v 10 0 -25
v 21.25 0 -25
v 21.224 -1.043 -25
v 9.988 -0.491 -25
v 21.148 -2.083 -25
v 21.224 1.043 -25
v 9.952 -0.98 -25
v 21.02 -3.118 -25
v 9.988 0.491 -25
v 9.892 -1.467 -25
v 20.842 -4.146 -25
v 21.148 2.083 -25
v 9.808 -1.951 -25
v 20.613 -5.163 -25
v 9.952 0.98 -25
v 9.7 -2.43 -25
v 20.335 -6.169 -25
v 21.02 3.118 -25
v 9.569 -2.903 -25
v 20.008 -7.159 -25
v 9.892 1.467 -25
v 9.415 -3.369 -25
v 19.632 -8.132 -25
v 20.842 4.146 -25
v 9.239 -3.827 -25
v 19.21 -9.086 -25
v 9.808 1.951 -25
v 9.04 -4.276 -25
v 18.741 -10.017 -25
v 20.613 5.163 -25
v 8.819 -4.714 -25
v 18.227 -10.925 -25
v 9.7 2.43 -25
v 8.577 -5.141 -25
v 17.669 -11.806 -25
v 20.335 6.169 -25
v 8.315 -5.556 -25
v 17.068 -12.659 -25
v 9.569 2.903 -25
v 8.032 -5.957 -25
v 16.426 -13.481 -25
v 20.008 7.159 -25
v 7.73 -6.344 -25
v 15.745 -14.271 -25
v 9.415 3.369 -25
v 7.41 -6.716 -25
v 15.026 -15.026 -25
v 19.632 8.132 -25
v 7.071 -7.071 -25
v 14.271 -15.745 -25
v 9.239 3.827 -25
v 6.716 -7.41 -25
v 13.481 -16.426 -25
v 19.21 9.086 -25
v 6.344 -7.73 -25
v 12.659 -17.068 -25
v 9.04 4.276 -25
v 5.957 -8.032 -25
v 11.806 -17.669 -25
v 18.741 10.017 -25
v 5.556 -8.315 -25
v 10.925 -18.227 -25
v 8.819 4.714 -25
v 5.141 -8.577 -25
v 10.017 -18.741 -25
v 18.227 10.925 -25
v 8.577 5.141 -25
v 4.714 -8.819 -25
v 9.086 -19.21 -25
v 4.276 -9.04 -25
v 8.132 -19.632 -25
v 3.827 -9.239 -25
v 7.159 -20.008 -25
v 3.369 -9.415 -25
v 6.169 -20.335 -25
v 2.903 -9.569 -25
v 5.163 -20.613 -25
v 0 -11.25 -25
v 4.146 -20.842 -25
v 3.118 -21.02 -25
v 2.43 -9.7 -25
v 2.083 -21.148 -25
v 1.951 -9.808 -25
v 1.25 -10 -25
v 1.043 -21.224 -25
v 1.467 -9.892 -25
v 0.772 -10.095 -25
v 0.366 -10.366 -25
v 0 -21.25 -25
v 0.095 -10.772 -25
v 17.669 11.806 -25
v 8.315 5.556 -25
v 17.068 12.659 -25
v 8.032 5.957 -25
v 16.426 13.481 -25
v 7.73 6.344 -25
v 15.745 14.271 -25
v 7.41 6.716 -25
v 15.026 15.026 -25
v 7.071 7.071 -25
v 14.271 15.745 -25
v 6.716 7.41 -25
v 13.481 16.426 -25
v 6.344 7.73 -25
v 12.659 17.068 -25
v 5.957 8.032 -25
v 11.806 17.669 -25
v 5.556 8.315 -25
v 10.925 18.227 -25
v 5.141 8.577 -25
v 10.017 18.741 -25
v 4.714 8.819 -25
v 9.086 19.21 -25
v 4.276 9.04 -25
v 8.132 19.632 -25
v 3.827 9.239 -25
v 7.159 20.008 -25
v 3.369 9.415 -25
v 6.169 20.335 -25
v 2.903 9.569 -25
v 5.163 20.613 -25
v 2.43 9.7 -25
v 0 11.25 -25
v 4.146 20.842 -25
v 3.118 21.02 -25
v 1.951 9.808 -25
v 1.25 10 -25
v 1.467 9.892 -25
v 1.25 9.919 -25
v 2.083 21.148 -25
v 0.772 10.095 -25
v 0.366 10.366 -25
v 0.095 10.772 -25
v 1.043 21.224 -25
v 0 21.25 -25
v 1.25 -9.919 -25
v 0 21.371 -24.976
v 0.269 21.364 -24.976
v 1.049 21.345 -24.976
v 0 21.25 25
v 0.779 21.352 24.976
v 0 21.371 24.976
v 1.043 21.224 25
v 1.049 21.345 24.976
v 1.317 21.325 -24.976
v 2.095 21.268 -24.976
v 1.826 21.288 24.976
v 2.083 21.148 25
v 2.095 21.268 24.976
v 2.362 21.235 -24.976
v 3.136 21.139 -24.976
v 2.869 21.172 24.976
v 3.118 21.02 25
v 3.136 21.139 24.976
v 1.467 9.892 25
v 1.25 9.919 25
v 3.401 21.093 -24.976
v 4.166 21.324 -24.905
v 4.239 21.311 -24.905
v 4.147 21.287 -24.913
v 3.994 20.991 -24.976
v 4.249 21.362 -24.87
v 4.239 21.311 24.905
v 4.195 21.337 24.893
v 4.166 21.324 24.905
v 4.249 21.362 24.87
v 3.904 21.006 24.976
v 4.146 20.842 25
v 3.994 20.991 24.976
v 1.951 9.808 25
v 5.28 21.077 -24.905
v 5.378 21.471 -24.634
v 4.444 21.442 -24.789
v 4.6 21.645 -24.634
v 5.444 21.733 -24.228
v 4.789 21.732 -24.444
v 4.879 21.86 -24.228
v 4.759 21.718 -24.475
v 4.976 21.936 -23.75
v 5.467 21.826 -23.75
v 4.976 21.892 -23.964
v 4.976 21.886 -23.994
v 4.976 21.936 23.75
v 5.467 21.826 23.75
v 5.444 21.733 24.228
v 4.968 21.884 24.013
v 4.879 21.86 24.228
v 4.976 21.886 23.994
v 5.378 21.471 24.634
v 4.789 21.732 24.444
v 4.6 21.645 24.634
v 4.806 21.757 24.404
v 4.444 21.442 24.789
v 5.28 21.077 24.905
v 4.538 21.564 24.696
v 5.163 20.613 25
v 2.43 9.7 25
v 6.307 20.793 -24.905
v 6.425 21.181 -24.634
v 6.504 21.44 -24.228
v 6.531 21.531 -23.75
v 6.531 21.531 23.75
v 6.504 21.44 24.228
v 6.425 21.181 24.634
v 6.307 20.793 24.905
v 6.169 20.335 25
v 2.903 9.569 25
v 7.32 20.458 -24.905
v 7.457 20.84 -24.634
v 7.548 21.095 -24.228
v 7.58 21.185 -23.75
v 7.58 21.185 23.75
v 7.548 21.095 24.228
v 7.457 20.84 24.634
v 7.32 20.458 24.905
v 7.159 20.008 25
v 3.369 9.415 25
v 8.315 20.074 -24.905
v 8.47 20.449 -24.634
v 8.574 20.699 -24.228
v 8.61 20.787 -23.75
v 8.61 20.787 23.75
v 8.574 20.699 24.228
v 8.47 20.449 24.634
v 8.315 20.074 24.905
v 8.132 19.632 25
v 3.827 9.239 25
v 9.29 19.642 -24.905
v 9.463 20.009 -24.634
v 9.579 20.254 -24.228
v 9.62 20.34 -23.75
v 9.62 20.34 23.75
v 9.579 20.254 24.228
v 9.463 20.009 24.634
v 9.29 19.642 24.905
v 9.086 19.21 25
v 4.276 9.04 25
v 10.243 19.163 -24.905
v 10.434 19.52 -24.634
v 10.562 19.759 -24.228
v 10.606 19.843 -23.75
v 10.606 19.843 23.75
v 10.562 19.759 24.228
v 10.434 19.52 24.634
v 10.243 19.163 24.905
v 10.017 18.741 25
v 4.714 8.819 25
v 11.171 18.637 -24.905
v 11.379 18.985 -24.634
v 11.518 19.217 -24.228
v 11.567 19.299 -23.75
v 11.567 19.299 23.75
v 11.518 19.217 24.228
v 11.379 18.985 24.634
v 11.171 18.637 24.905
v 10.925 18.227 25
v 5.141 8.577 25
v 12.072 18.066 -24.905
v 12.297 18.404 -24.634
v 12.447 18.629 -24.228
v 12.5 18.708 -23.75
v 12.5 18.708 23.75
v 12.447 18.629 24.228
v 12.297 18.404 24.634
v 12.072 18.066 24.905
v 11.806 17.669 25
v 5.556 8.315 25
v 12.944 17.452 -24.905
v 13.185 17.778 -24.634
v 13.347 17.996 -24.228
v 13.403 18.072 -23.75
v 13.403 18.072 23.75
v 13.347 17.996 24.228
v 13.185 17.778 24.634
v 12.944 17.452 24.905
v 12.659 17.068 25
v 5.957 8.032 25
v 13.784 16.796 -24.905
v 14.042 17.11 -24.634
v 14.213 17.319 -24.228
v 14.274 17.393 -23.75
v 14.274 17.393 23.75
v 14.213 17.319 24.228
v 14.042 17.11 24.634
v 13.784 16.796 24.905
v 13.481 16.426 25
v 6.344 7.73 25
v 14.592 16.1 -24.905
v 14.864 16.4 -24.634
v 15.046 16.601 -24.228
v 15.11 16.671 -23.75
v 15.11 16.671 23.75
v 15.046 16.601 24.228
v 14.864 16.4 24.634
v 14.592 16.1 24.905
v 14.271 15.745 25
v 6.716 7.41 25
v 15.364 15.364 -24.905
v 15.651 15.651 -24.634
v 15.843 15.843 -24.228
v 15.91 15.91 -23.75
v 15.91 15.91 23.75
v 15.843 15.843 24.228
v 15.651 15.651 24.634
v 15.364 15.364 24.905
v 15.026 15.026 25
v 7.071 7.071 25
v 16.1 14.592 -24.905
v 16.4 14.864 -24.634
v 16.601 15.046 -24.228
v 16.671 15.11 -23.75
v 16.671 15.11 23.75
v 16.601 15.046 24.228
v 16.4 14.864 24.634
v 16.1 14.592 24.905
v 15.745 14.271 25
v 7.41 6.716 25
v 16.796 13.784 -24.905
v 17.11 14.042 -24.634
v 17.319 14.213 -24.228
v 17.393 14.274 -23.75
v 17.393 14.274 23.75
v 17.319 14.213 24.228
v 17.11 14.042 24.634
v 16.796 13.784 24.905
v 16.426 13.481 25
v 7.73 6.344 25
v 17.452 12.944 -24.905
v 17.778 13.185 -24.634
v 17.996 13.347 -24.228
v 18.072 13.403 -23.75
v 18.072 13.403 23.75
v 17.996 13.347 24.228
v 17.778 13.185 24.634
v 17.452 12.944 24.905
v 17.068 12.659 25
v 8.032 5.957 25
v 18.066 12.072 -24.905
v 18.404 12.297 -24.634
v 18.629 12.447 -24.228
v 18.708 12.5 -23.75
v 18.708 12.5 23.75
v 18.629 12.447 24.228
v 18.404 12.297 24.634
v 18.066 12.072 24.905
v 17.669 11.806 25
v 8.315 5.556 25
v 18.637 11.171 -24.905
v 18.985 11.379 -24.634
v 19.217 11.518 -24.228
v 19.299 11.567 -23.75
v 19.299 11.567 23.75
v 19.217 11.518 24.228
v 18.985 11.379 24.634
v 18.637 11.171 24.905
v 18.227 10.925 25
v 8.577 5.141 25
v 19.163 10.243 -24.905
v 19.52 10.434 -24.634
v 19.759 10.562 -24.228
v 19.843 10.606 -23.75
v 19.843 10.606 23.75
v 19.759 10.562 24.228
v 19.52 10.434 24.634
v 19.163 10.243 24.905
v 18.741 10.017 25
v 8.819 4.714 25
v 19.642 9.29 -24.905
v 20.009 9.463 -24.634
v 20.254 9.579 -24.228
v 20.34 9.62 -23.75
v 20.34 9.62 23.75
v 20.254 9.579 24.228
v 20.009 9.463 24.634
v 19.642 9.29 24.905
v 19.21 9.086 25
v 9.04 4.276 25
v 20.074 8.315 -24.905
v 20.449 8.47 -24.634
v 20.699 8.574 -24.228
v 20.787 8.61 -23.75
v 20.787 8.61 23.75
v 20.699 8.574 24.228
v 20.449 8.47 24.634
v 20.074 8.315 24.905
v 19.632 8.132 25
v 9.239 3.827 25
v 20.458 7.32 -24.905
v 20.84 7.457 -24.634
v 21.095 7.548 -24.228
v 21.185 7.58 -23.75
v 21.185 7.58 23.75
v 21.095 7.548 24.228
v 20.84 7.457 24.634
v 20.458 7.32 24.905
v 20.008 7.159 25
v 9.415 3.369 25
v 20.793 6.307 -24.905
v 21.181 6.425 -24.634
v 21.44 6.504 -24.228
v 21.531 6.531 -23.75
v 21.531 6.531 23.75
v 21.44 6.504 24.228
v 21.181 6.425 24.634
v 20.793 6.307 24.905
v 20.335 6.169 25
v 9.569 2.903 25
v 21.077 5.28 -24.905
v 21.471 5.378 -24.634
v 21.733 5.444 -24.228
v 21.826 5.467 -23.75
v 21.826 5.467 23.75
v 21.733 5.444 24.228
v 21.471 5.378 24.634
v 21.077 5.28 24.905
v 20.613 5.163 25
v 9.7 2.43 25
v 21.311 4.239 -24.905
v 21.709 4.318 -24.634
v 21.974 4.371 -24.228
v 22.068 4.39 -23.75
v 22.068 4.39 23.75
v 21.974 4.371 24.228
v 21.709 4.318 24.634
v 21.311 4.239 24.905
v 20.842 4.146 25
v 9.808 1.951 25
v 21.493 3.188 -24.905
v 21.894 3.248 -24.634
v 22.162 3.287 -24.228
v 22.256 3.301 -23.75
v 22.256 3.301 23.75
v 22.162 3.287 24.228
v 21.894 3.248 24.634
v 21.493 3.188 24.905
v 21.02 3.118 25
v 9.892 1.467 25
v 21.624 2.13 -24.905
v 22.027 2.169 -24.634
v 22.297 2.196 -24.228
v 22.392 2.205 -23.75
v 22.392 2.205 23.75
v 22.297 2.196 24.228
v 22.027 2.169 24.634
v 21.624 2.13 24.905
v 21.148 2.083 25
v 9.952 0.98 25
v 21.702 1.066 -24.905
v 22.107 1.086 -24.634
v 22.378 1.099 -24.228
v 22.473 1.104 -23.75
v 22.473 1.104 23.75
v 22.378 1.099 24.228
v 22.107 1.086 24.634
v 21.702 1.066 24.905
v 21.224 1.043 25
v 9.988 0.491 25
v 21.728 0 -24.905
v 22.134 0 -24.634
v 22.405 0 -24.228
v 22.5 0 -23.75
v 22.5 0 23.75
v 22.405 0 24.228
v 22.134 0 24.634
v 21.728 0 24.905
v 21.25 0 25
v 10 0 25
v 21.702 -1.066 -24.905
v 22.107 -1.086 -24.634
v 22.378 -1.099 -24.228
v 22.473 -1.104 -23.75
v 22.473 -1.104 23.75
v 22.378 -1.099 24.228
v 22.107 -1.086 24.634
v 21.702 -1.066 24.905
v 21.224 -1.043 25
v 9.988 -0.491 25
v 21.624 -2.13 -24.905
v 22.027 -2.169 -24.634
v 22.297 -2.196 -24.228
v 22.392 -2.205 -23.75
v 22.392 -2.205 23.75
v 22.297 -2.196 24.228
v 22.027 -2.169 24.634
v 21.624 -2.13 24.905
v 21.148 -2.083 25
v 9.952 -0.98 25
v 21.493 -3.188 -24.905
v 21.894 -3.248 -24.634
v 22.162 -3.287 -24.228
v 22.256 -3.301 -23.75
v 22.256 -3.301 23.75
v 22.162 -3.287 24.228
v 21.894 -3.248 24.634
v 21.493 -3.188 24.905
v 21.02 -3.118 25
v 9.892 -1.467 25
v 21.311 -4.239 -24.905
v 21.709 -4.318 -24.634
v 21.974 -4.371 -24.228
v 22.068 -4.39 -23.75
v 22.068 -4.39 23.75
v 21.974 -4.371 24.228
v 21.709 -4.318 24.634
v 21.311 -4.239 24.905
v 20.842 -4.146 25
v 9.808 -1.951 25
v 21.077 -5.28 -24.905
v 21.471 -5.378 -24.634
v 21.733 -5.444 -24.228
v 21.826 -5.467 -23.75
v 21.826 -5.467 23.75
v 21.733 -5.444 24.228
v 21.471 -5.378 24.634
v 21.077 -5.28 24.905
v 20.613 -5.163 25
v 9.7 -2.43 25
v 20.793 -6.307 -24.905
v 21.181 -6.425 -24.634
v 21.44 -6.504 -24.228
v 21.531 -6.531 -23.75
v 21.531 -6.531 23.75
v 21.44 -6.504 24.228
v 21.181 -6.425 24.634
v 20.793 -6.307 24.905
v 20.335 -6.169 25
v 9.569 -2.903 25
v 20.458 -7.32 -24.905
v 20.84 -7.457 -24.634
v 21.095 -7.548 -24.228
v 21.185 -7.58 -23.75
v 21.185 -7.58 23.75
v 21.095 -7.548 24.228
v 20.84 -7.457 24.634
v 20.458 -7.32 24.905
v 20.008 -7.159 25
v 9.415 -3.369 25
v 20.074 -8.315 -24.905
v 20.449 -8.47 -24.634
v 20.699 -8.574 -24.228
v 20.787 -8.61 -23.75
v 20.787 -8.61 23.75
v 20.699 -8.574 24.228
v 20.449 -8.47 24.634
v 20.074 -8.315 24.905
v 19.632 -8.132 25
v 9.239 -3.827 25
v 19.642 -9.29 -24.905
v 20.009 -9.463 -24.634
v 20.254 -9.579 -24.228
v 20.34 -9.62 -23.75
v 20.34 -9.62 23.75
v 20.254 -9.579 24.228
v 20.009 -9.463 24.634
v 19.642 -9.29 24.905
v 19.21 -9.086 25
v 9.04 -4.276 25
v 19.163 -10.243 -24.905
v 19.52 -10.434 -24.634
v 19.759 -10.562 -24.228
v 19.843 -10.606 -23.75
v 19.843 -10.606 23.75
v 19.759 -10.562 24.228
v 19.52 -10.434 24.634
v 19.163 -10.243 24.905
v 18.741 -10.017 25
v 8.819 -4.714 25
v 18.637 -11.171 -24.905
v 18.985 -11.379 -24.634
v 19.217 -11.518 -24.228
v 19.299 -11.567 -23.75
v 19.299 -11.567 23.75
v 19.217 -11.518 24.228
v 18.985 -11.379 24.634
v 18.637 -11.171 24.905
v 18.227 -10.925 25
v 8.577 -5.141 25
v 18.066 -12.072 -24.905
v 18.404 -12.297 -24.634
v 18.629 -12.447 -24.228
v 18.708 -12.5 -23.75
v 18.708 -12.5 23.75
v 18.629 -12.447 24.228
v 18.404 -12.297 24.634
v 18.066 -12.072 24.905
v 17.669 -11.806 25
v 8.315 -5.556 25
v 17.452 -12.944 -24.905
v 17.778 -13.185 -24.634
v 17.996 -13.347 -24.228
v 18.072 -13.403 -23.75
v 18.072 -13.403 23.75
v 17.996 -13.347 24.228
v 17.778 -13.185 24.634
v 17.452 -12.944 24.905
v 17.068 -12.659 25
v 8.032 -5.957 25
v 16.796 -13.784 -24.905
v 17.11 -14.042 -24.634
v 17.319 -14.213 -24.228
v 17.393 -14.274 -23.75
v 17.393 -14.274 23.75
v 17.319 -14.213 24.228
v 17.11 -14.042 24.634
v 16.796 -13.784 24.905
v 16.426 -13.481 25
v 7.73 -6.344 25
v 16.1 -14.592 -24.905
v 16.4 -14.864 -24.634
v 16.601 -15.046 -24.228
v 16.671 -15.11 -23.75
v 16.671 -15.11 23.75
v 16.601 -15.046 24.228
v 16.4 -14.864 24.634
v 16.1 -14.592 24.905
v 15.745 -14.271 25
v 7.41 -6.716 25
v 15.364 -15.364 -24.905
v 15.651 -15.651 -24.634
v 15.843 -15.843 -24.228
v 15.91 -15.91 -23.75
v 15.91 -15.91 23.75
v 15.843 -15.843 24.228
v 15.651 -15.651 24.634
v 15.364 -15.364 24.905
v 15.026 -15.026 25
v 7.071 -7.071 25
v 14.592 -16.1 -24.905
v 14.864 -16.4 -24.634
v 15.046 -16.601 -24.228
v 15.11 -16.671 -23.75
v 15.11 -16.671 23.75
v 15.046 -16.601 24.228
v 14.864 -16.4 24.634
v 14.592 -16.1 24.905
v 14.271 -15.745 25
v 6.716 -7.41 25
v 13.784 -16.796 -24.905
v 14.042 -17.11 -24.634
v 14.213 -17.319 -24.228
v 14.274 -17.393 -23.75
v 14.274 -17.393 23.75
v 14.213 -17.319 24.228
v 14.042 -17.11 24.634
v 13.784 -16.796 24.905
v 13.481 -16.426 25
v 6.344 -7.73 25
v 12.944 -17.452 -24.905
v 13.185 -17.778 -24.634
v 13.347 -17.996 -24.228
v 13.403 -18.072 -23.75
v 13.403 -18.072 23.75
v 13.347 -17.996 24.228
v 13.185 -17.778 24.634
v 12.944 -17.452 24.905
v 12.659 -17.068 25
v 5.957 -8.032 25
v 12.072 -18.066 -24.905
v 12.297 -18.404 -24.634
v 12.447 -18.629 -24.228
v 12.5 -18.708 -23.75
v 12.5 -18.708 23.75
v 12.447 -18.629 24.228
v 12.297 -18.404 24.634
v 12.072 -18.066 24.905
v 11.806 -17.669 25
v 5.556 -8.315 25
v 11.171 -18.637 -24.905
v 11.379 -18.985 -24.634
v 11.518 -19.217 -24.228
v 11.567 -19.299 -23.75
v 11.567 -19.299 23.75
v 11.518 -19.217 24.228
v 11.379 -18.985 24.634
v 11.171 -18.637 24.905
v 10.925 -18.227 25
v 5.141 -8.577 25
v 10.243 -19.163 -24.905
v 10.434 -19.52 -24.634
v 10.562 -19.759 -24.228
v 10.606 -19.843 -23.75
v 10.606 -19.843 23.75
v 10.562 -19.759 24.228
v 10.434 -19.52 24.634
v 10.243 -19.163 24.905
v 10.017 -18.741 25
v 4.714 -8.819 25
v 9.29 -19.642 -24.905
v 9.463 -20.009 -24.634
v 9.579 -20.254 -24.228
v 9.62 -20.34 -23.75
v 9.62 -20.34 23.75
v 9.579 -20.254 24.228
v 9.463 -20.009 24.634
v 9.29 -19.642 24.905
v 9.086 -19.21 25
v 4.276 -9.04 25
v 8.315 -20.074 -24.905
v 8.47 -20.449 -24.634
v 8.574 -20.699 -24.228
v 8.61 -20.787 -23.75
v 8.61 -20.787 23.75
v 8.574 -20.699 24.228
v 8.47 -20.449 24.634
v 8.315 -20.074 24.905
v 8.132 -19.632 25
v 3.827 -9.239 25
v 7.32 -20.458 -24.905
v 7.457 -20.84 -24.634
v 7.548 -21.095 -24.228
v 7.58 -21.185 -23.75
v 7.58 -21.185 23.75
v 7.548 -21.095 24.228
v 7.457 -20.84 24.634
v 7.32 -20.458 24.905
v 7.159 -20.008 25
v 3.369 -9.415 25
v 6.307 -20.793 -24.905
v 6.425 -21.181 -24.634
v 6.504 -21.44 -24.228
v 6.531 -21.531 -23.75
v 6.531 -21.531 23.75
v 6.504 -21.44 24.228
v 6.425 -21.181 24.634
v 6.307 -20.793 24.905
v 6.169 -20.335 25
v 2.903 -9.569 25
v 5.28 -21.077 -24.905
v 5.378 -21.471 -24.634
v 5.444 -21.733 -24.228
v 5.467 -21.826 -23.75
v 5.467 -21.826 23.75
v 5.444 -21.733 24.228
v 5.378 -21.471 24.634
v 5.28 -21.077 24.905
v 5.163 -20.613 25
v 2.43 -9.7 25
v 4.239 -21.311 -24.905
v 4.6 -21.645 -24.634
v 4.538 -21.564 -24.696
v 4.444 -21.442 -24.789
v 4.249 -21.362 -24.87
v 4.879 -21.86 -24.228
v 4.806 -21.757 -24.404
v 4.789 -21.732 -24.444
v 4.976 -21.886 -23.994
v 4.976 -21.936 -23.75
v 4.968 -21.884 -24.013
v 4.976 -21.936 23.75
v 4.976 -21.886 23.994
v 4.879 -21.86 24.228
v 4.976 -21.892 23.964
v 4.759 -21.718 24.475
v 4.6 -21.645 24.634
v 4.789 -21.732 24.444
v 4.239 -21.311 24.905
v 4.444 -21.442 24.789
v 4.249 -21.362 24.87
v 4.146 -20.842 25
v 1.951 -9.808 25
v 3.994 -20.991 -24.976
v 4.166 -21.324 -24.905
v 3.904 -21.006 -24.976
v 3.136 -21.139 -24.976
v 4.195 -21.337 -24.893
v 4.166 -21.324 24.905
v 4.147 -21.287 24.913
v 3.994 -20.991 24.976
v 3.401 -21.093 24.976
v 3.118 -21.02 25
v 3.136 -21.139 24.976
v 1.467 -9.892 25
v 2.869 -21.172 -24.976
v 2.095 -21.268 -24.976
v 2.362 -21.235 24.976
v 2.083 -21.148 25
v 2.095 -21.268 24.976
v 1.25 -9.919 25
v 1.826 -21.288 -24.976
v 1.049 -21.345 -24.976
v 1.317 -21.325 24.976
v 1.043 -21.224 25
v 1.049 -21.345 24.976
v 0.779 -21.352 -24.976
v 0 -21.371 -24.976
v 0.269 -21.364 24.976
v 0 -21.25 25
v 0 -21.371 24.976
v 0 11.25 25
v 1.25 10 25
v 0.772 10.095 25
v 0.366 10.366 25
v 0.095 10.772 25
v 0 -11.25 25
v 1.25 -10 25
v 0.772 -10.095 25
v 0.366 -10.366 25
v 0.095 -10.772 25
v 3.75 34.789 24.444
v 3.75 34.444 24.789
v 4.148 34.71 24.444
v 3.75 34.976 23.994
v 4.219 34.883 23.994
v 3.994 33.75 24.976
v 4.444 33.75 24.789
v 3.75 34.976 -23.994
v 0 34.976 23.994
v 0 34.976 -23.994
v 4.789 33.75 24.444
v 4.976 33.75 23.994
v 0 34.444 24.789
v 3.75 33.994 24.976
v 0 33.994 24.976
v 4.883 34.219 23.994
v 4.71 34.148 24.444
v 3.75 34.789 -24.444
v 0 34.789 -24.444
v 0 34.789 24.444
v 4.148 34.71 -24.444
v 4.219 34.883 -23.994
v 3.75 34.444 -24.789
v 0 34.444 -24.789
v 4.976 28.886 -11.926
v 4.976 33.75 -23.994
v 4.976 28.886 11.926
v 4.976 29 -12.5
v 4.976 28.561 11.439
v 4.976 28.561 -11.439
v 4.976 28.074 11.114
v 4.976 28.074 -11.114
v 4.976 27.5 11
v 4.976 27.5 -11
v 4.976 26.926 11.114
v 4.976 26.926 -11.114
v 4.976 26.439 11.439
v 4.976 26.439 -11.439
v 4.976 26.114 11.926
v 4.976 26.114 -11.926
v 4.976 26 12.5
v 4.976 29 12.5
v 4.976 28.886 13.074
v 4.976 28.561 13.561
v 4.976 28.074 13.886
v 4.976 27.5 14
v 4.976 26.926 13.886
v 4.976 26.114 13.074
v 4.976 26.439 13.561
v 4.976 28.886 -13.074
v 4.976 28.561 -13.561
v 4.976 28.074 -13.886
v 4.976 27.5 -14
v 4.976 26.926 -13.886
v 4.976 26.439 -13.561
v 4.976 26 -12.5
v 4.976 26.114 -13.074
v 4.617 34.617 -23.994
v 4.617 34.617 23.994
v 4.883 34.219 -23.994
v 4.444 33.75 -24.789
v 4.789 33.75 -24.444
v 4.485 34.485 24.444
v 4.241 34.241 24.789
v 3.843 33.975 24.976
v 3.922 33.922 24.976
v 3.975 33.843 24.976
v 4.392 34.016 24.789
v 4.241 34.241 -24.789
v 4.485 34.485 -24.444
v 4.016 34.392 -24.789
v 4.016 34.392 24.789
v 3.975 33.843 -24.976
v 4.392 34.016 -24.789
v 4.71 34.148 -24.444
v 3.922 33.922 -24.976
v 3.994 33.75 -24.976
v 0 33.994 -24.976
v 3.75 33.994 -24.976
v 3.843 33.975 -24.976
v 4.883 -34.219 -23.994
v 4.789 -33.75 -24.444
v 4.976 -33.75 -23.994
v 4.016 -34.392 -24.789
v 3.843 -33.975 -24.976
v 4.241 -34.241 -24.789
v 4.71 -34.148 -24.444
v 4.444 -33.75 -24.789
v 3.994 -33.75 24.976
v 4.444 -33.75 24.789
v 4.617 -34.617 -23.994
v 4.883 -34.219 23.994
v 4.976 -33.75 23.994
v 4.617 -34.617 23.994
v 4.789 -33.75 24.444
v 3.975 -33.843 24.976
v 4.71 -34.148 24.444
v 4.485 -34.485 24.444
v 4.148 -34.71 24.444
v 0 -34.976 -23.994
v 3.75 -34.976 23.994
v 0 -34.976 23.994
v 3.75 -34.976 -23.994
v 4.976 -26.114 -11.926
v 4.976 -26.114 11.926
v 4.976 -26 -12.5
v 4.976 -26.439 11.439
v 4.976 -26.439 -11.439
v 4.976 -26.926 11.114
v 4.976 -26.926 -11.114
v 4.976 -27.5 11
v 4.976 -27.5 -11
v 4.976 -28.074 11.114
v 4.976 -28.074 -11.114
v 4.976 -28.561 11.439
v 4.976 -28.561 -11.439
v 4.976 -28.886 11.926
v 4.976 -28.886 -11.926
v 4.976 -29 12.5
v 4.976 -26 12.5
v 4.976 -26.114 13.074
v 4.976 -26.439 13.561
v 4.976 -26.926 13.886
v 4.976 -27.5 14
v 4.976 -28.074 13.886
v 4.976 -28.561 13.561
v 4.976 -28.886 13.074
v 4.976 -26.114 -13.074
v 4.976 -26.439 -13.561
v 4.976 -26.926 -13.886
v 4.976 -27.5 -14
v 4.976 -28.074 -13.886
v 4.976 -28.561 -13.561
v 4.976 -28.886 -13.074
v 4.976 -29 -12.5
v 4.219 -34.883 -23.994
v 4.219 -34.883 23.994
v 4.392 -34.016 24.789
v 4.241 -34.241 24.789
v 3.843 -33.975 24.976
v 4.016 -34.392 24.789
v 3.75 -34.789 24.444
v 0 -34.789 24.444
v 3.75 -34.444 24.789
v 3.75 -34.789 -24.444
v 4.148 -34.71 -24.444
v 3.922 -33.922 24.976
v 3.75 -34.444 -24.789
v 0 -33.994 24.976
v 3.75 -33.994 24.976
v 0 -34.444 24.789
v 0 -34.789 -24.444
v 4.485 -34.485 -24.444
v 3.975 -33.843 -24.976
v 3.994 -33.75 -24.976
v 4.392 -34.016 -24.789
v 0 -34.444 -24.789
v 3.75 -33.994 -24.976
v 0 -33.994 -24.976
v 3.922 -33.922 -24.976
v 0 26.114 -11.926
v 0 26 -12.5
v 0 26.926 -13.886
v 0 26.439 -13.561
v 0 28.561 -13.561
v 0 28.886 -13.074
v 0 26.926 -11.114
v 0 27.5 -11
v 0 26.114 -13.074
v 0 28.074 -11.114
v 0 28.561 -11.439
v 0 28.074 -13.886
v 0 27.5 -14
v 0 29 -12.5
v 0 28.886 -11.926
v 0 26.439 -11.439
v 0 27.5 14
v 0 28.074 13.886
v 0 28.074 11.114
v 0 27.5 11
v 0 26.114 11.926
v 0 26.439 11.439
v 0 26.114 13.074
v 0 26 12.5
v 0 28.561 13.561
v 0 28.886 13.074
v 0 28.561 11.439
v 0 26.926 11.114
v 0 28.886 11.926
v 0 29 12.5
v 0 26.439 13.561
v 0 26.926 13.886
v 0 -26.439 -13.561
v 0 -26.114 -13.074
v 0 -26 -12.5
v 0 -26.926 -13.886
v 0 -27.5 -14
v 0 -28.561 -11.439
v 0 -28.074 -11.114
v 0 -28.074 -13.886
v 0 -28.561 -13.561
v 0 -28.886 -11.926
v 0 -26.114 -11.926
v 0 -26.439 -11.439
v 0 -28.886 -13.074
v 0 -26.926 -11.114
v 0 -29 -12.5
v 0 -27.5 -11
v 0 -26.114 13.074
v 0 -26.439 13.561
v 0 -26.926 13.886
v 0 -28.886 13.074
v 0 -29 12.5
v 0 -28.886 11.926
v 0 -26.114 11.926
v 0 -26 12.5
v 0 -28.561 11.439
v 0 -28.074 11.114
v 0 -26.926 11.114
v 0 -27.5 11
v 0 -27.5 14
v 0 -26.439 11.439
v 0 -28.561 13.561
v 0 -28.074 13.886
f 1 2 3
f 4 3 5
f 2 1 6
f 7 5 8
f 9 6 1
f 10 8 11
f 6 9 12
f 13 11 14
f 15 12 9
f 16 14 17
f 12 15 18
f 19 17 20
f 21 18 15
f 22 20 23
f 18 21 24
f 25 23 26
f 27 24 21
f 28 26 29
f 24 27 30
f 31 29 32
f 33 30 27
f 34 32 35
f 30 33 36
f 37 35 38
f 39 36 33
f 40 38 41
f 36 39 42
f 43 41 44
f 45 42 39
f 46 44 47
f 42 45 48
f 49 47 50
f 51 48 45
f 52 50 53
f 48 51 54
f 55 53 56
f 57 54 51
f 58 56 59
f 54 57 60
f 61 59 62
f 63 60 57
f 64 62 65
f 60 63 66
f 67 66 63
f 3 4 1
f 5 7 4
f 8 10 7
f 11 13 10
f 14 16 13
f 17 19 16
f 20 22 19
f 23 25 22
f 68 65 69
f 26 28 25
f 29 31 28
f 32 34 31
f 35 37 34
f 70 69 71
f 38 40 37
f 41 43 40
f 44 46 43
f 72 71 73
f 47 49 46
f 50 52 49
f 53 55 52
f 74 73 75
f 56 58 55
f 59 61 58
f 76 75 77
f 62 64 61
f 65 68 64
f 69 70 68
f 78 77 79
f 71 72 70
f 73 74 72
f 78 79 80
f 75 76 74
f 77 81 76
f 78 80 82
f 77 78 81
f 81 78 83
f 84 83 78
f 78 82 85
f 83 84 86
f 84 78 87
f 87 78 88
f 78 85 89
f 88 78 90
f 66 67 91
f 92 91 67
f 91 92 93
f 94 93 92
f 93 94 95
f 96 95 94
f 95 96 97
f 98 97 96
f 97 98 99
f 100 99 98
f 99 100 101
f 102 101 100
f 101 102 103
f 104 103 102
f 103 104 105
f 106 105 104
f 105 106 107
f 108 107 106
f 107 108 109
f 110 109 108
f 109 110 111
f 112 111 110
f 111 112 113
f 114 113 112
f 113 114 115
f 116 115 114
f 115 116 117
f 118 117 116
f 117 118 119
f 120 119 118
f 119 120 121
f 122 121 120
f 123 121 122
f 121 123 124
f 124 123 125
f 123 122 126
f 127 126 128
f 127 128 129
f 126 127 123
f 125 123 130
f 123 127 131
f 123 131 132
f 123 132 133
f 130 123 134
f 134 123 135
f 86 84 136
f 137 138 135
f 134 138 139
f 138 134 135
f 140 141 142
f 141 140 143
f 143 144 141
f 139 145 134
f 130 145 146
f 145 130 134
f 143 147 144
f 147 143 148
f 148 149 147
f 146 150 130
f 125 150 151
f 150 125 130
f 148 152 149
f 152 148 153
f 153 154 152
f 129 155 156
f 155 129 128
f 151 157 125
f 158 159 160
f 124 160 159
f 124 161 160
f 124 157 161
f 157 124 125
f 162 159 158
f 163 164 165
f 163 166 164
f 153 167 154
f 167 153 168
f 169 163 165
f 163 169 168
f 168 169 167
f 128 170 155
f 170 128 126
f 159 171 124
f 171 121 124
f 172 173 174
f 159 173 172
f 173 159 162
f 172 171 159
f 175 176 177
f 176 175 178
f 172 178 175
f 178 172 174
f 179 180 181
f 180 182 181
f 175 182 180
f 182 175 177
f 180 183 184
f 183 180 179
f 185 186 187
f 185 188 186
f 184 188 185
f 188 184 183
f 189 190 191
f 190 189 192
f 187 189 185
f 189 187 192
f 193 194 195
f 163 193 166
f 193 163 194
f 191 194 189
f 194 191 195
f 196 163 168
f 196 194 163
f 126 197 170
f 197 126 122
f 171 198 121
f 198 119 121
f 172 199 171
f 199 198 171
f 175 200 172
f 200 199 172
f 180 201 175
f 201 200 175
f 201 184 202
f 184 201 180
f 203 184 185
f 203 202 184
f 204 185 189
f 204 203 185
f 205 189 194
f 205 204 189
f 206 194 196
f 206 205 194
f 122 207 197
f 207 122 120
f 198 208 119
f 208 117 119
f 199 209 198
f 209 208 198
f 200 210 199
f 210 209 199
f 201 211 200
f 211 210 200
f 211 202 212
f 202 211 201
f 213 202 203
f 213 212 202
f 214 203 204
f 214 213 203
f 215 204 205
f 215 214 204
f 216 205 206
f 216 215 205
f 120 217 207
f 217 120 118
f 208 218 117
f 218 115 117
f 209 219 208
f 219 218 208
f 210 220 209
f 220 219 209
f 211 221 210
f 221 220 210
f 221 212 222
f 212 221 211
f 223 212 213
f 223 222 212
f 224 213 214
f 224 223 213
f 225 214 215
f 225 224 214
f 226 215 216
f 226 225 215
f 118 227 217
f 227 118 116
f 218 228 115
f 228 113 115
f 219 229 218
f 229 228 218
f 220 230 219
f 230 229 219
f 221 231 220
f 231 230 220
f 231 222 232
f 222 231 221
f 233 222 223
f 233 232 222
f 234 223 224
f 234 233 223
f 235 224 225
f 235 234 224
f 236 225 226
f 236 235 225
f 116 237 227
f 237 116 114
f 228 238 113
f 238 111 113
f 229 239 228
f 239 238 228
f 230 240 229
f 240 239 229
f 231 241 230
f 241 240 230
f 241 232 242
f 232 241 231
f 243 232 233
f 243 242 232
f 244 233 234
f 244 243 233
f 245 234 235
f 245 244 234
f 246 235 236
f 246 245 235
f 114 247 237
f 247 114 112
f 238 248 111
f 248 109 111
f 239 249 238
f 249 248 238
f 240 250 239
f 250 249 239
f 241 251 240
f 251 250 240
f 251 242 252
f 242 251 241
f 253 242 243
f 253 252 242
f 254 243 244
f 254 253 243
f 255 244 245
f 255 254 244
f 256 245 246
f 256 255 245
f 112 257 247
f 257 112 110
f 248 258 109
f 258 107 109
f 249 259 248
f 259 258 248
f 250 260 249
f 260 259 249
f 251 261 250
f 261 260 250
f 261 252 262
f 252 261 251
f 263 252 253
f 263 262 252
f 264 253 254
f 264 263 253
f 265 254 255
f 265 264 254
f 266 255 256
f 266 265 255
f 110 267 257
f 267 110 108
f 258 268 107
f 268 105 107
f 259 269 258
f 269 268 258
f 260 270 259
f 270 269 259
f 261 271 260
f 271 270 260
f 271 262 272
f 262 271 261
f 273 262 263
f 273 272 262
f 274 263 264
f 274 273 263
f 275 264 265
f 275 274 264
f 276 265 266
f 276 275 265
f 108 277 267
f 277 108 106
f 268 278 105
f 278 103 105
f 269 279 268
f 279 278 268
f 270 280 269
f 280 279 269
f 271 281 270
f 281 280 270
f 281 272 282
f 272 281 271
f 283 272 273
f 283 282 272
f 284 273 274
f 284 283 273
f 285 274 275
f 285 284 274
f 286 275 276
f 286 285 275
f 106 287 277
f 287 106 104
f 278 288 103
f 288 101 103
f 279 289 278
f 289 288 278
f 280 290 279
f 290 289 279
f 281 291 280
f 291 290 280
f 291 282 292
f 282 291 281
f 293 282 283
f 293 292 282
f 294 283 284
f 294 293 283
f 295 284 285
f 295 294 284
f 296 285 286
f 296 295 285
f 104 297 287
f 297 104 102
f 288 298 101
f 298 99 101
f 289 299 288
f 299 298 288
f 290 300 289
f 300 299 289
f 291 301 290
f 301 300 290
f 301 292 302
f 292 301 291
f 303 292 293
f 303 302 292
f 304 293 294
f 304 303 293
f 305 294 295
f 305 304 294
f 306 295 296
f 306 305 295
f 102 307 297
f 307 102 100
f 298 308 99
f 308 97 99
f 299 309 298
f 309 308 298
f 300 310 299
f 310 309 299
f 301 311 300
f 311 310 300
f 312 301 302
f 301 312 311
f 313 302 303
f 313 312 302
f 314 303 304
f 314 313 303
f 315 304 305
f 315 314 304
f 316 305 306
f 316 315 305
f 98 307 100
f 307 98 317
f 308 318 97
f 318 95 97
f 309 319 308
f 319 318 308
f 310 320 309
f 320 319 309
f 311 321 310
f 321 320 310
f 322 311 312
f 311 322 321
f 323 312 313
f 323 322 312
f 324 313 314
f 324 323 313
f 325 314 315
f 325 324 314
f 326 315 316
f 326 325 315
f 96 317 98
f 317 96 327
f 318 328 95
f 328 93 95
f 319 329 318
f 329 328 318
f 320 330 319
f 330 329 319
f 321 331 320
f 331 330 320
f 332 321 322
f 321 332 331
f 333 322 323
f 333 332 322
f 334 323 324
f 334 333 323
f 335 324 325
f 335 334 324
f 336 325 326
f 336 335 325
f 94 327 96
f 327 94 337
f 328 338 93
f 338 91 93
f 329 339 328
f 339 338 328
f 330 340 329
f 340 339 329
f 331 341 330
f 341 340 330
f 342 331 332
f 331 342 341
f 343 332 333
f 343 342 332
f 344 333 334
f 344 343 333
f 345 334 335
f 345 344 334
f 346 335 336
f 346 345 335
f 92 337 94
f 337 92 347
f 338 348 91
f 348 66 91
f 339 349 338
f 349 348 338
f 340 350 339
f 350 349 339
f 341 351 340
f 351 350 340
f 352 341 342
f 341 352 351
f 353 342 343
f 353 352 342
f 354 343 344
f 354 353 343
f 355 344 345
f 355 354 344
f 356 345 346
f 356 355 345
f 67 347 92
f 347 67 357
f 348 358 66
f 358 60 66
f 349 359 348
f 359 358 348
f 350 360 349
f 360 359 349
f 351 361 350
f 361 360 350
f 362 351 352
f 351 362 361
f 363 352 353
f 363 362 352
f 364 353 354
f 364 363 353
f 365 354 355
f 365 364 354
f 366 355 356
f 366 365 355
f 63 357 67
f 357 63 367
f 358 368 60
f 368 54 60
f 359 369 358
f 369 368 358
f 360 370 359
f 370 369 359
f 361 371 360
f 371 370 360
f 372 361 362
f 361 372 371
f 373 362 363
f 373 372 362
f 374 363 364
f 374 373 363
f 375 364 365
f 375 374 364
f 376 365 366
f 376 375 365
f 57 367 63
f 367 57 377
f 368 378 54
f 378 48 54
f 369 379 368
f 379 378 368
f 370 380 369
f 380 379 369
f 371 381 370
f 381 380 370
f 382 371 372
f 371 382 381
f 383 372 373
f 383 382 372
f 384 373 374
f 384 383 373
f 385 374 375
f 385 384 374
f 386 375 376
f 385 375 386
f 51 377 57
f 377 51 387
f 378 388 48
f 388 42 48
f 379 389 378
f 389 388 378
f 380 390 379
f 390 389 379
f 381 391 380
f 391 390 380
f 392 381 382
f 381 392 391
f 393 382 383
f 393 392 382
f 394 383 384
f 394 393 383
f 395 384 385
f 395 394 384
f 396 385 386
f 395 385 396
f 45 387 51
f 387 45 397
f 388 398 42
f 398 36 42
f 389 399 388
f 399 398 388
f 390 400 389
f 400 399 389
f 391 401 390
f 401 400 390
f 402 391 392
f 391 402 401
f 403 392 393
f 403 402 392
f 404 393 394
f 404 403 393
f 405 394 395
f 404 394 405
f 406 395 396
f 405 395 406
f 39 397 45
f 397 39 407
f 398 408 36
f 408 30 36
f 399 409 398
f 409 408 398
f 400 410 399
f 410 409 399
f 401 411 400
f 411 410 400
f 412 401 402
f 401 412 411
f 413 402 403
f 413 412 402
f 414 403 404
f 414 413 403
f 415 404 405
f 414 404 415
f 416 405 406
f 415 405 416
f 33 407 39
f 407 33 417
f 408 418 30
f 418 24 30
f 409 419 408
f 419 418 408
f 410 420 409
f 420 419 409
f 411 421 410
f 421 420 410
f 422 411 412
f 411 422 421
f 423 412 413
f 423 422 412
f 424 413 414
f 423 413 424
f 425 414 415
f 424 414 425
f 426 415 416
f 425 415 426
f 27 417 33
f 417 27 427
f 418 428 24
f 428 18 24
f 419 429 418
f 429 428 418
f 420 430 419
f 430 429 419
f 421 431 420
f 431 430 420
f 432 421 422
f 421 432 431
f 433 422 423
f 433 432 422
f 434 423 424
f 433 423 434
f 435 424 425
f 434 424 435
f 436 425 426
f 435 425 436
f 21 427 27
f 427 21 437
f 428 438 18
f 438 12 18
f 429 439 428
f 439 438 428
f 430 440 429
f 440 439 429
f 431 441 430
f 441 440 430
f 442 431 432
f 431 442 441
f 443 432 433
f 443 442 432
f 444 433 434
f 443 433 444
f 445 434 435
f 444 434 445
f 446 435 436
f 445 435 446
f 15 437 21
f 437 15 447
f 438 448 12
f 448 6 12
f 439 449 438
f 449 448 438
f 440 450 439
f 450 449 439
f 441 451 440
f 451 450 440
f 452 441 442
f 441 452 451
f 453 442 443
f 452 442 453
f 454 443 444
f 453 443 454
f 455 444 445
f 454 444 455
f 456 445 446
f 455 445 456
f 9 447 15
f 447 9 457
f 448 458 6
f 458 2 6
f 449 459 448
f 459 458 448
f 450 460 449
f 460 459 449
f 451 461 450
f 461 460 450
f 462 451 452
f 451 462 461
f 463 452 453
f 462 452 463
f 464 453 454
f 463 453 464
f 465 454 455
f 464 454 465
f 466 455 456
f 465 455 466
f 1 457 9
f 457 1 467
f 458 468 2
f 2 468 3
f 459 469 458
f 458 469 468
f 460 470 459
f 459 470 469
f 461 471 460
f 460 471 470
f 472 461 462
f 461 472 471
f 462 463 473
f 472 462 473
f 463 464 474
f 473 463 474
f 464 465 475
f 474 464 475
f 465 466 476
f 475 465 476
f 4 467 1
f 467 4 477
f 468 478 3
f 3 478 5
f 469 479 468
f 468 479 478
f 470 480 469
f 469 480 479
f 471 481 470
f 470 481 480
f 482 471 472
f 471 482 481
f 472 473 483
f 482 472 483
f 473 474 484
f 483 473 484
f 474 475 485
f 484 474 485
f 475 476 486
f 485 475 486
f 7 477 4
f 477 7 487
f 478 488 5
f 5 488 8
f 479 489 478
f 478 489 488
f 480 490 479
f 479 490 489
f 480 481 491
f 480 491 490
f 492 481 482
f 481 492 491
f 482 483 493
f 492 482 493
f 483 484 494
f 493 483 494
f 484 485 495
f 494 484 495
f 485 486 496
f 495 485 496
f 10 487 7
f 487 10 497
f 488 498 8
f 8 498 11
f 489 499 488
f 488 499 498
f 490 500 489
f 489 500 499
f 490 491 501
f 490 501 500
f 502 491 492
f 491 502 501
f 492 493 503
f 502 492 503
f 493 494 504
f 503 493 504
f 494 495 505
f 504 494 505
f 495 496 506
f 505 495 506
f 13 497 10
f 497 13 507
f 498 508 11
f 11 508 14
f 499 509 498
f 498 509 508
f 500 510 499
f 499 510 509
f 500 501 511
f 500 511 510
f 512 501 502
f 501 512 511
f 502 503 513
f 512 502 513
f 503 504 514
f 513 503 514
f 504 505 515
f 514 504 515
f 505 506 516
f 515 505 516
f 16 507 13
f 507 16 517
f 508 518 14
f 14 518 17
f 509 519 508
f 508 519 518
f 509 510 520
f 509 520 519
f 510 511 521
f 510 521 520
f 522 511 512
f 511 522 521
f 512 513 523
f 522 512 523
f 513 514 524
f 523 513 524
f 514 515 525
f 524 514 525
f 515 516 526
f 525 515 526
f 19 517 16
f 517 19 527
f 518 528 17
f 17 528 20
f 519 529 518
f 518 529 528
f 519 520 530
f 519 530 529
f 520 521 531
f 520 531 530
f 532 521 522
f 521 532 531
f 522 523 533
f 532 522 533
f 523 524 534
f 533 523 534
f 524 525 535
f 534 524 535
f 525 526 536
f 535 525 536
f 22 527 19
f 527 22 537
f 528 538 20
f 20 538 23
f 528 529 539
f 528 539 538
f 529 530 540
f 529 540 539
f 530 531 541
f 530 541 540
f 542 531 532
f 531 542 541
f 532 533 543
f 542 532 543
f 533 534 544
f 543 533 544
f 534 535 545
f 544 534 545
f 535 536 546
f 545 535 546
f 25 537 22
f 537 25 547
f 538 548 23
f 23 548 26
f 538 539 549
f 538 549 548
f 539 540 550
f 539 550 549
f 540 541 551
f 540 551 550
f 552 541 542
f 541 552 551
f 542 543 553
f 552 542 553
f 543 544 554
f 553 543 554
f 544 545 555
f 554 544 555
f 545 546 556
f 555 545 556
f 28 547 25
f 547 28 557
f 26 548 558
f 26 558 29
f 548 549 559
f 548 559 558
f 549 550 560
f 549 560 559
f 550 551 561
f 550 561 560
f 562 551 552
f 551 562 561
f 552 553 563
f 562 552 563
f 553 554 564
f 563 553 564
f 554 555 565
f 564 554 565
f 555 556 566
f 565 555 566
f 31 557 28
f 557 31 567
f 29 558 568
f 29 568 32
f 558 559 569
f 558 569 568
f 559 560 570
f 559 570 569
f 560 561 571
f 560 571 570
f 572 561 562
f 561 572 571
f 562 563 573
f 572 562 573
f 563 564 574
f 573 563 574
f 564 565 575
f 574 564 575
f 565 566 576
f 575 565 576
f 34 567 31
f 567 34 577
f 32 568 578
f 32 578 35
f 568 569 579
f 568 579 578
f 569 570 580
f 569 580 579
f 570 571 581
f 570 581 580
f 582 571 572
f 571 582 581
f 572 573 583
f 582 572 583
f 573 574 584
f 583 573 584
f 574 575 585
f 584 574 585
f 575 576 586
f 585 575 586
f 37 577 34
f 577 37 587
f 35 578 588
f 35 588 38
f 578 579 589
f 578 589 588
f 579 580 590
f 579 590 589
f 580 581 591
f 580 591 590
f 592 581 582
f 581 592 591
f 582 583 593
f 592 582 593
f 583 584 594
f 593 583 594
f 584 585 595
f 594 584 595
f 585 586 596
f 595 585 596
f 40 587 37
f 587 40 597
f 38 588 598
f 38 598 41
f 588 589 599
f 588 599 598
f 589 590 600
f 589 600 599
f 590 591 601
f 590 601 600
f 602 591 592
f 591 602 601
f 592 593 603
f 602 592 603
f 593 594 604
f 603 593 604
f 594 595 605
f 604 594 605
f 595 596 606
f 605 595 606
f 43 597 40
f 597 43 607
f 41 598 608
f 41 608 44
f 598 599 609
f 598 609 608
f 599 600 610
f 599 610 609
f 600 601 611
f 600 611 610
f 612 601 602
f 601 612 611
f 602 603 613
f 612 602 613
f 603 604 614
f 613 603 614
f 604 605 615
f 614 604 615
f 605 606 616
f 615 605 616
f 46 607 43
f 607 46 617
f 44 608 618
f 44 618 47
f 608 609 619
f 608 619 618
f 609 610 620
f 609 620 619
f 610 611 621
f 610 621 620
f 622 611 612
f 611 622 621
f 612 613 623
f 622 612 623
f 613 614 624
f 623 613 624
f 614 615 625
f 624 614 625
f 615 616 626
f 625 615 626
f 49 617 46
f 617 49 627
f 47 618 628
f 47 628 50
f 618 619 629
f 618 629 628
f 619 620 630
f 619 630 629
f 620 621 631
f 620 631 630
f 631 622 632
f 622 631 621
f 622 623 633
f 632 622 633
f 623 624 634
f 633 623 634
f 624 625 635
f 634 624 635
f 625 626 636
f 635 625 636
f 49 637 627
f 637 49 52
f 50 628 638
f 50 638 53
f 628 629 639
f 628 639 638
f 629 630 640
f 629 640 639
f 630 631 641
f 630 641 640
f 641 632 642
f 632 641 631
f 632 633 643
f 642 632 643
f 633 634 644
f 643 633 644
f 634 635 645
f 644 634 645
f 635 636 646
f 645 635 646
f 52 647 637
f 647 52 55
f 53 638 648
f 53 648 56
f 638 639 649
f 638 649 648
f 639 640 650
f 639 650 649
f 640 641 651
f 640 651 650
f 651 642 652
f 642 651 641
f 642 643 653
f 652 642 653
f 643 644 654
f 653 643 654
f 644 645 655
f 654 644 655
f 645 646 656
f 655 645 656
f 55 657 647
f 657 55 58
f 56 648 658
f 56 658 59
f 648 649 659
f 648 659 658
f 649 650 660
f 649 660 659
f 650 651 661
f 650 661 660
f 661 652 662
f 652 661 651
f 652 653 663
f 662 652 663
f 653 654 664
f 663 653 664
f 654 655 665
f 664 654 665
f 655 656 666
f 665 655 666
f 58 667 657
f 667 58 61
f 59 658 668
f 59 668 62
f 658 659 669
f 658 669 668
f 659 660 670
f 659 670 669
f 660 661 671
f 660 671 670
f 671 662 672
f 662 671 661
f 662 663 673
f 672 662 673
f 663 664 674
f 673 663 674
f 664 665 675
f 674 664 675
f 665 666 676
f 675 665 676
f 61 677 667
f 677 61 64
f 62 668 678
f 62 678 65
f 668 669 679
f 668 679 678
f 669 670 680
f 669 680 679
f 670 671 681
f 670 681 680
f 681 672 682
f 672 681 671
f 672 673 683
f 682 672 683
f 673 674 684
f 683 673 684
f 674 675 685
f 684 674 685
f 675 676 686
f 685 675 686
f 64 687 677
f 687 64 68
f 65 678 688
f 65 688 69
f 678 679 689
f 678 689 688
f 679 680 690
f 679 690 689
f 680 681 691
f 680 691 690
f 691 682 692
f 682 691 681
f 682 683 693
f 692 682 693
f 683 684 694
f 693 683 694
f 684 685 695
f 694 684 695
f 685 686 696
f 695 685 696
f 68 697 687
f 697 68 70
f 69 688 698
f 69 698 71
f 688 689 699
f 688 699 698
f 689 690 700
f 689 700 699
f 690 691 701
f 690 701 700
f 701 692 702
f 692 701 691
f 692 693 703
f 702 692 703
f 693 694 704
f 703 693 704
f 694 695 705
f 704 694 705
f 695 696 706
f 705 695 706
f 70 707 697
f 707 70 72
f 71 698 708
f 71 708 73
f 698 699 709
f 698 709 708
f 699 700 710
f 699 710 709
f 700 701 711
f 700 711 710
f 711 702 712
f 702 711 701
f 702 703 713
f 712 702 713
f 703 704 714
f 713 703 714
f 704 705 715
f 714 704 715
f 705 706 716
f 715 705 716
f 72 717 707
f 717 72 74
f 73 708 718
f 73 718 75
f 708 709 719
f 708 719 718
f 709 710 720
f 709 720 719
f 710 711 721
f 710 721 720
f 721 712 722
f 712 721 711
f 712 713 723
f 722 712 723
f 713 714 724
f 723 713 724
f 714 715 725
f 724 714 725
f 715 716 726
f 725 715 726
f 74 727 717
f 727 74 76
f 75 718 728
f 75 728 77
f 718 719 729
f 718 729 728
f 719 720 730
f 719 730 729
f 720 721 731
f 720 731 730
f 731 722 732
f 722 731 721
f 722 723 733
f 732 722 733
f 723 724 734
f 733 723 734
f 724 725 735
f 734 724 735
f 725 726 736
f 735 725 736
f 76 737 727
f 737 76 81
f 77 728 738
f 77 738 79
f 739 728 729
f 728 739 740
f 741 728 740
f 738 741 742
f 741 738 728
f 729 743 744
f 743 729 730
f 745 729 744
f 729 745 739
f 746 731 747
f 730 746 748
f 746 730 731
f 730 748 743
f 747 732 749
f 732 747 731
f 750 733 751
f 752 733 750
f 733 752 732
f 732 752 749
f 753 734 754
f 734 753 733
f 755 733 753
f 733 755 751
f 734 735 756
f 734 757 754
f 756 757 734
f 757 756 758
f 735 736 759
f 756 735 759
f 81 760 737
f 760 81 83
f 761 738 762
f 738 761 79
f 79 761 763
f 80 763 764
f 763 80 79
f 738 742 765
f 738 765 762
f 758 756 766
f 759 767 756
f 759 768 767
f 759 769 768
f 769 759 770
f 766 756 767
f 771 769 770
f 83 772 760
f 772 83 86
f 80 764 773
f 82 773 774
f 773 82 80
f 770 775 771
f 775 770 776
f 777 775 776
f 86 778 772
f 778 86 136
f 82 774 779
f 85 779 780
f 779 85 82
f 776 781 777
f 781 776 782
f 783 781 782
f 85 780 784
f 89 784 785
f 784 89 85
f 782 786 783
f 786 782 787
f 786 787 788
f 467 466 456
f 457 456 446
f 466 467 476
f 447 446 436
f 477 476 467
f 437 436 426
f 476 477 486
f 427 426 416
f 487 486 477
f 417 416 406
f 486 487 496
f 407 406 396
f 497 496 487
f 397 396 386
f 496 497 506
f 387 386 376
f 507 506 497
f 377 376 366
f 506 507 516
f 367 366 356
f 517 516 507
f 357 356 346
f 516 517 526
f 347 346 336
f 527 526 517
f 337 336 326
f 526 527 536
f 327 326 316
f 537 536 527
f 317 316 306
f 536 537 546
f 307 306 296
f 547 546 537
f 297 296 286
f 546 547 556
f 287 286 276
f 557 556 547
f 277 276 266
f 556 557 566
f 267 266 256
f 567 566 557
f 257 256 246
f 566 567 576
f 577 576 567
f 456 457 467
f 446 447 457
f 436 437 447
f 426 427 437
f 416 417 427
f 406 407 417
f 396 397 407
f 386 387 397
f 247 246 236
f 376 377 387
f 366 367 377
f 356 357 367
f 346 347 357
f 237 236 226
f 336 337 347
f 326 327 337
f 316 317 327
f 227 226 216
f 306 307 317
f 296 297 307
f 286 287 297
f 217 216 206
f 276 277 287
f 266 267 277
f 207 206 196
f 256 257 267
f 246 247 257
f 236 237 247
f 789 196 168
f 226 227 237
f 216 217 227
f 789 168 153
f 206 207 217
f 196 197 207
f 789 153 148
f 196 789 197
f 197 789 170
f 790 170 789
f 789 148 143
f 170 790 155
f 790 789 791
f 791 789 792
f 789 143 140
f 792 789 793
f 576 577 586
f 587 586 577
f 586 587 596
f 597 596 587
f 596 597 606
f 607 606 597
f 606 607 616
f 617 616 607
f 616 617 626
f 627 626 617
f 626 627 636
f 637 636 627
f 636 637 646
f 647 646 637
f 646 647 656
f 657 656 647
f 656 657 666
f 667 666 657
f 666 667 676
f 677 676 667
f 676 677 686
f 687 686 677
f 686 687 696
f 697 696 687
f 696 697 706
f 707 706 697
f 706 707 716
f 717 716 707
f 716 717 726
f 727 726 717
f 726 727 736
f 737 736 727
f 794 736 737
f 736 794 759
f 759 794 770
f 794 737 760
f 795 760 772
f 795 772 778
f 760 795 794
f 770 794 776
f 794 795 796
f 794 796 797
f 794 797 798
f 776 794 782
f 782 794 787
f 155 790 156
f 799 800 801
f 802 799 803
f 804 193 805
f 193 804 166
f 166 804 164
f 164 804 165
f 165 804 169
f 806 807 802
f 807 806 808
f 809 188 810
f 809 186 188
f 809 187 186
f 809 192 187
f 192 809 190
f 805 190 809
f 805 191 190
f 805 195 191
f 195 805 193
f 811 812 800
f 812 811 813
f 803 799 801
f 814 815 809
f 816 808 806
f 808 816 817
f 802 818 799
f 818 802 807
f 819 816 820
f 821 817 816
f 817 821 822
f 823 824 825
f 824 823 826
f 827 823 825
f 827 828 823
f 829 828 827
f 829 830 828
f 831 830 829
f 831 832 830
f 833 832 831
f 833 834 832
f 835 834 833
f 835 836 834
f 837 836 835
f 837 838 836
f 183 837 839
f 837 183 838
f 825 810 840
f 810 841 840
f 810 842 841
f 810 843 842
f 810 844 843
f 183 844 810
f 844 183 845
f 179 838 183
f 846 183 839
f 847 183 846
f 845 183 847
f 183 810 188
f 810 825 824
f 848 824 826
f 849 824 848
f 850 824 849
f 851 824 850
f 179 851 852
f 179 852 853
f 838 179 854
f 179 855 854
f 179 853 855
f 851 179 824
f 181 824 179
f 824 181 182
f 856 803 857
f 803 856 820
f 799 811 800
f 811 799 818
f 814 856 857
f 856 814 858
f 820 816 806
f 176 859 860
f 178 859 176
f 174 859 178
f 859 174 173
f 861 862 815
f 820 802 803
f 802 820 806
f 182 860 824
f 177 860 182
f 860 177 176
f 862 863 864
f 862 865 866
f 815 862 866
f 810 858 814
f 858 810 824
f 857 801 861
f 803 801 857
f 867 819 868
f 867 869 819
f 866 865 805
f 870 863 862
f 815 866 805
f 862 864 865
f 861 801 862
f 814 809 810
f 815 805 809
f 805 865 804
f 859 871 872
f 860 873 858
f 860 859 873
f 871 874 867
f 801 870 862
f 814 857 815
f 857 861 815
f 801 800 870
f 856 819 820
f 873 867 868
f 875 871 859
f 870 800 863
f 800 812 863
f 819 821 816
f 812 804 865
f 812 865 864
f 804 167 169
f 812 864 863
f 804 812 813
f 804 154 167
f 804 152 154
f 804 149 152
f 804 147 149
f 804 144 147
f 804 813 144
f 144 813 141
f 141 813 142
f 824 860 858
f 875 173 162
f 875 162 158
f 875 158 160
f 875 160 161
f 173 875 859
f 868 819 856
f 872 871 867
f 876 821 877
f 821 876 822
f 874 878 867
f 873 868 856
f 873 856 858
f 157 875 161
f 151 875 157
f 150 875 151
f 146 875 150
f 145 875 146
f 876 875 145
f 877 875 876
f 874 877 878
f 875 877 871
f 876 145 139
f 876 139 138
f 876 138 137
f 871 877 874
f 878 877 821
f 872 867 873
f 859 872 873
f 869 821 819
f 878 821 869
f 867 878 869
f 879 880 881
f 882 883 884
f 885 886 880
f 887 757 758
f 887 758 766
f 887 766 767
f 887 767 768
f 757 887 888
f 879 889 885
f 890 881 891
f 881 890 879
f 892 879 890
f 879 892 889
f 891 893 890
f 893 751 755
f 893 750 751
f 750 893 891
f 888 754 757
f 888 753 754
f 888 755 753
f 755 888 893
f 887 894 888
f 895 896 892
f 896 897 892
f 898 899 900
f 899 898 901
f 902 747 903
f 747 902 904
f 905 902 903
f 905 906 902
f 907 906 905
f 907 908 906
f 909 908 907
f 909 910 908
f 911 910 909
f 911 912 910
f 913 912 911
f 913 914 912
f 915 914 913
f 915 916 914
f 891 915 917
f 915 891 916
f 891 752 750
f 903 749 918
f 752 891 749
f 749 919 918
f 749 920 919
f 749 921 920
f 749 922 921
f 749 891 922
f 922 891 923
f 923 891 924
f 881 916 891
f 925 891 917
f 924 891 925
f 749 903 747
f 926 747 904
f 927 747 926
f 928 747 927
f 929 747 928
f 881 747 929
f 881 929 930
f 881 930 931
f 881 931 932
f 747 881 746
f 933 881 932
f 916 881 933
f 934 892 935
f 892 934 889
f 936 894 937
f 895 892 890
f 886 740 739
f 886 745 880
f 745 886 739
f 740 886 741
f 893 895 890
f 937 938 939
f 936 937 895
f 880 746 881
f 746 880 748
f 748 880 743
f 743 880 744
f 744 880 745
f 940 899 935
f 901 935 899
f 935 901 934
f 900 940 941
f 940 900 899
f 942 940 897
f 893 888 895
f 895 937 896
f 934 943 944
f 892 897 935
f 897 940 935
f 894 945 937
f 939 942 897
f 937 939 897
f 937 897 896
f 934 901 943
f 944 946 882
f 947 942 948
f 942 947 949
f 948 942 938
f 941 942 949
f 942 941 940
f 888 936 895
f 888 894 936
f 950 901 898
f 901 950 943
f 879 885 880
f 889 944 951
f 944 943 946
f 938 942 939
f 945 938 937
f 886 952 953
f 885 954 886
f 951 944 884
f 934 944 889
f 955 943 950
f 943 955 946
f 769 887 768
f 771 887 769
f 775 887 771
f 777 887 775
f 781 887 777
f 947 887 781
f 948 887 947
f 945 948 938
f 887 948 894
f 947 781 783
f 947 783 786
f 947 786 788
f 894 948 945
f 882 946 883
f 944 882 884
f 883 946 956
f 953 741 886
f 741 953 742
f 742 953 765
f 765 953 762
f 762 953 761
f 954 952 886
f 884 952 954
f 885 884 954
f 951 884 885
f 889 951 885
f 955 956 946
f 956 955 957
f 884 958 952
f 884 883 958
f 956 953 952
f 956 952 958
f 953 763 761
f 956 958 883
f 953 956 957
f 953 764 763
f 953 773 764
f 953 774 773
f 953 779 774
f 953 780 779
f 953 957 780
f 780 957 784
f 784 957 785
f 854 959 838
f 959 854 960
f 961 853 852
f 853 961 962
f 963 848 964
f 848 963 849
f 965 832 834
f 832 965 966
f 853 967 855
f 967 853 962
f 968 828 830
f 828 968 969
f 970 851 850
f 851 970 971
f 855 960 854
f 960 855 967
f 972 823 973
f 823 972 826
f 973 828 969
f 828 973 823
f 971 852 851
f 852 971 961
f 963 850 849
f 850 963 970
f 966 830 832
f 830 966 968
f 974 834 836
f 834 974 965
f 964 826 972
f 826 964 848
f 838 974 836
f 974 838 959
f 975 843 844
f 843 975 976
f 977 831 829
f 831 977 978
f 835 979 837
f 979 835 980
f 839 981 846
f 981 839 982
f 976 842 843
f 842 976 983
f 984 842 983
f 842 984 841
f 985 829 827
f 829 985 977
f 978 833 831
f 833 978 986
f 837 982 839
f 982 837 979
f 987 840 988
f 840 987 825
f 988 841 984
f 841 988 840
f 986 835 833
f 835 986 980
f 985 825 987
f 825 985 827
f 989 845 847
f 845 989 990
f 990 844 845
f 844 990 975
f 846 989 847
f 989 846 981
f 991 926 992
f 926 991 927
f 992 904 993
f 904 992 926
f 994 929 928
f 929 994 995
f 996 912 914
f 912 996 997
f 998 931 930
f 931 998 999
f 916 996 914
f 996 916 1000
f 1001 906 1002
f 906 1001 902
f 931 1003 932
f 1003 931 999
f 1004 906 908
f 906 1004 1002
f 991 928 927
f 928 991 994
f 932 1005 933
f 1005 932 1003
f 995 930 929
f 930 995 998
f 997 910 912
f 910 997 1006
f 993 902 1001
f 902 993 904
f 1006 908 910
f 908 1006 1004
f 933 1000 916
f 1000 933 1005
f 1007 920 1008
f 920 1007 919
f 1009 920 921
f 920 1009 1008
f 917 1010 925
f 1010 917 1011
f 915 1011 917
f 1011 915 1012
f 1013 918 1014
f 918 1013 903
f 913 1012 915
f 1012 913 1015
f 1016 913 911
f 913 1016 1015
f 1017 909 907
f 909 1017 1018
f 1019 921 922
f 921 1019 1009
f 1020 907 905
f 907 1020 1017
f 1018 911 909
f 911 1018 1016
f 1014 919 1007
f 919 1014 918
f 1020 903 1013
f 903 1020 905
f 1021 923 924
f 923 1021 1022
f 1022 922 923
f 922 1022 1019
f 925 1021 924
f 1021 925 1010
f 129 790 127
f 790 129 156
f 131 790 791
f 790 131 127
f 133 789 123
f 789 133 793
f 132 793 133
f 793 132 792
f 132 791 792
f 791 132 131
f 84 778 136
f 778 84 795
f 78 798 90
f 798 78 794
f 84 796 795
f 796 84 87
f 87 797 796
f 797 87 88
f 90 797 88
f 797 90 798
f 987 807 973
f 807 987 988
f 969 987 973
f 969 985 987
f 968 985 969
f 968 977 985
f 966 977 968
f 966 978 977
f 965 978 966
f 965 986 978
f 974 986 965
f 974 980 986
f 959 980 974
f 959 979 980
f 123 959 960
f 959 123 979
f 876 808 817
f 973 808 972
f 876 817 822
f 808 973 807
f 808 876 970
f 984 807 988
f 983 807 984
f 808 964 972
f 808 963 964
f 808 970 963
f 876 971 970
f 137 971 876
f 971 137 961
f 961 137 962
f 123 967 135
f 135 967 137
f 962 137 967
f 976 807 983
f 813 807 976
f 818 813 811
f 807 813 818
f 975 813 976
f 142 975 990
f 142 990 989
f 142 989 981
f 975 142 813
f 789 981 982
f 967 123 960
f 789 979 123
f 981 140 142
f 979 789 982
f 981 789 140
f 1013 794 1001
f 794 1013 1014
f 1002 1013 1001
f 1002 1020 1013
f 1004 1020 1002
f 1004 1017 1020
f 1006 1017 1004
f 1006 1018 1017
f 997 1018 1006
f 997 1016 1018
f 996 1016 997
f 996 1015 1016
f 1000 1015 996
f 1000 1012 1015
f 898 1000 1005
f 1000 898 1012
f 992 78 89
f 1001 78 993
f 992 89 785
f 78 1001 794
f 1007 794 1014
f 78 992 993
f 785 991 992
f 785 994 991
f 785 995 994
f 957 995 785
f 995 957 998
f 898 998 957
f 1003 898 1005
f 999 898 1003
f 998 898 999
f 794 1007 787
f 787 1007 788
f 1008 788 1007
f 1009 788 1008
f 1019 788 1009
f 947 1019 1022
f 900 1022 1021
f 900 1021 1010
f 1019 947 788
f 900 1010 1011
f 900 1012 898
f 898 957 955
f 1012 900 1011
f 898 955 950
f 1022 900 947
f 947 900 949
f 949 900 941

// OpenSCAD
inner_diameter = 20;
width = 10;
clamp_width = 5;
clamp_length = 15;
height = 50;
holesize = 3;
roundingRadius = clamp_width/4;
roundingDetail = 16;

module roundedBox(dim, r)
{
  hull() {
    for (z=[-0.5,0.5], y=[-0.5,0.5], x=[-0.5,0.5]) {
      translate([x*(dim.x-2*r), y*(dim.y-2*r), z*(dim.z-2*r)]) sphere(r, $fn=roundingDetail);
    }
  }
}

module clampCylinder()
{
  rotate_extrude(convexity=2, $fn=128)
    translate([inner_diameter/2 + width/4,0]) {
        hull() {
          square([width/2, height], center=true);
          translate([width-roundingRadius,-height/2+roundingRadius]) circle(roundingRadius, $fn=roundingDetail);
          translate([width-roundingRadius,height/2-roundingRadius]) circle(roundingRadius, $fn=roundingDetail);
        }
    }
}

module clamp() {
	hole_horiz_pos = clamp_length+width+inner_diameter/2 - clamp_length/2;
	
	module hole() {
	  rotate([0,90,0]) cylinder($fn=16, r=holesize/2, h=clamp_width*2.5, center=true);
	}

	difference() {
            union() {
                clampCylinder();
	        translate([0, (clamp_length+width/2)/2 + width/2 + inner_diameter/2]) 
	          roundedBox([2*clamp_width, clamp_length+width/2, height], roundingRadius);
	        translate([0, -(clamp_length+width/2)/2 - width/2 - inner_diameter/2]) 
	          roundedBox([2*clamp_width, clamp_length+width/2, height], roundingRadius);
            }
                
	    translate([0,hole_horiz_pos,-height/4]) hole();
	    translate([0,hole_horiz_pos,height/4]) hole();
	    translate([0,-hole_horiz_pos,-height/4]) hole();
	    translate([0,-hole_horiz_pos,height/4]) hole();
	}
}

module innerProfile()
{
  difference() {
      cube([roundingRadius*2, roundingRadius*2, height*1.2], center=true);
      translate([roundingRadius, roundingRadius, 0]) cylinder(h=height*1.3, r=roundingRadius, center=true, $fn=roundingDetail);
  }
}

cubesize = 2.1*[inner_diameter+width, inner_diameter+width+clamp_length, height];
difference() {
    clamp();
    translate([-cubesize.x/2, 0, 0]) cube(cubesize, center=true);
    translate([0, inner_diameter/2, 0]) innerProfile();
    translate([0, -inner_diameter/2, 0]) rotate([0,0,-90]) innerProfile();
}
